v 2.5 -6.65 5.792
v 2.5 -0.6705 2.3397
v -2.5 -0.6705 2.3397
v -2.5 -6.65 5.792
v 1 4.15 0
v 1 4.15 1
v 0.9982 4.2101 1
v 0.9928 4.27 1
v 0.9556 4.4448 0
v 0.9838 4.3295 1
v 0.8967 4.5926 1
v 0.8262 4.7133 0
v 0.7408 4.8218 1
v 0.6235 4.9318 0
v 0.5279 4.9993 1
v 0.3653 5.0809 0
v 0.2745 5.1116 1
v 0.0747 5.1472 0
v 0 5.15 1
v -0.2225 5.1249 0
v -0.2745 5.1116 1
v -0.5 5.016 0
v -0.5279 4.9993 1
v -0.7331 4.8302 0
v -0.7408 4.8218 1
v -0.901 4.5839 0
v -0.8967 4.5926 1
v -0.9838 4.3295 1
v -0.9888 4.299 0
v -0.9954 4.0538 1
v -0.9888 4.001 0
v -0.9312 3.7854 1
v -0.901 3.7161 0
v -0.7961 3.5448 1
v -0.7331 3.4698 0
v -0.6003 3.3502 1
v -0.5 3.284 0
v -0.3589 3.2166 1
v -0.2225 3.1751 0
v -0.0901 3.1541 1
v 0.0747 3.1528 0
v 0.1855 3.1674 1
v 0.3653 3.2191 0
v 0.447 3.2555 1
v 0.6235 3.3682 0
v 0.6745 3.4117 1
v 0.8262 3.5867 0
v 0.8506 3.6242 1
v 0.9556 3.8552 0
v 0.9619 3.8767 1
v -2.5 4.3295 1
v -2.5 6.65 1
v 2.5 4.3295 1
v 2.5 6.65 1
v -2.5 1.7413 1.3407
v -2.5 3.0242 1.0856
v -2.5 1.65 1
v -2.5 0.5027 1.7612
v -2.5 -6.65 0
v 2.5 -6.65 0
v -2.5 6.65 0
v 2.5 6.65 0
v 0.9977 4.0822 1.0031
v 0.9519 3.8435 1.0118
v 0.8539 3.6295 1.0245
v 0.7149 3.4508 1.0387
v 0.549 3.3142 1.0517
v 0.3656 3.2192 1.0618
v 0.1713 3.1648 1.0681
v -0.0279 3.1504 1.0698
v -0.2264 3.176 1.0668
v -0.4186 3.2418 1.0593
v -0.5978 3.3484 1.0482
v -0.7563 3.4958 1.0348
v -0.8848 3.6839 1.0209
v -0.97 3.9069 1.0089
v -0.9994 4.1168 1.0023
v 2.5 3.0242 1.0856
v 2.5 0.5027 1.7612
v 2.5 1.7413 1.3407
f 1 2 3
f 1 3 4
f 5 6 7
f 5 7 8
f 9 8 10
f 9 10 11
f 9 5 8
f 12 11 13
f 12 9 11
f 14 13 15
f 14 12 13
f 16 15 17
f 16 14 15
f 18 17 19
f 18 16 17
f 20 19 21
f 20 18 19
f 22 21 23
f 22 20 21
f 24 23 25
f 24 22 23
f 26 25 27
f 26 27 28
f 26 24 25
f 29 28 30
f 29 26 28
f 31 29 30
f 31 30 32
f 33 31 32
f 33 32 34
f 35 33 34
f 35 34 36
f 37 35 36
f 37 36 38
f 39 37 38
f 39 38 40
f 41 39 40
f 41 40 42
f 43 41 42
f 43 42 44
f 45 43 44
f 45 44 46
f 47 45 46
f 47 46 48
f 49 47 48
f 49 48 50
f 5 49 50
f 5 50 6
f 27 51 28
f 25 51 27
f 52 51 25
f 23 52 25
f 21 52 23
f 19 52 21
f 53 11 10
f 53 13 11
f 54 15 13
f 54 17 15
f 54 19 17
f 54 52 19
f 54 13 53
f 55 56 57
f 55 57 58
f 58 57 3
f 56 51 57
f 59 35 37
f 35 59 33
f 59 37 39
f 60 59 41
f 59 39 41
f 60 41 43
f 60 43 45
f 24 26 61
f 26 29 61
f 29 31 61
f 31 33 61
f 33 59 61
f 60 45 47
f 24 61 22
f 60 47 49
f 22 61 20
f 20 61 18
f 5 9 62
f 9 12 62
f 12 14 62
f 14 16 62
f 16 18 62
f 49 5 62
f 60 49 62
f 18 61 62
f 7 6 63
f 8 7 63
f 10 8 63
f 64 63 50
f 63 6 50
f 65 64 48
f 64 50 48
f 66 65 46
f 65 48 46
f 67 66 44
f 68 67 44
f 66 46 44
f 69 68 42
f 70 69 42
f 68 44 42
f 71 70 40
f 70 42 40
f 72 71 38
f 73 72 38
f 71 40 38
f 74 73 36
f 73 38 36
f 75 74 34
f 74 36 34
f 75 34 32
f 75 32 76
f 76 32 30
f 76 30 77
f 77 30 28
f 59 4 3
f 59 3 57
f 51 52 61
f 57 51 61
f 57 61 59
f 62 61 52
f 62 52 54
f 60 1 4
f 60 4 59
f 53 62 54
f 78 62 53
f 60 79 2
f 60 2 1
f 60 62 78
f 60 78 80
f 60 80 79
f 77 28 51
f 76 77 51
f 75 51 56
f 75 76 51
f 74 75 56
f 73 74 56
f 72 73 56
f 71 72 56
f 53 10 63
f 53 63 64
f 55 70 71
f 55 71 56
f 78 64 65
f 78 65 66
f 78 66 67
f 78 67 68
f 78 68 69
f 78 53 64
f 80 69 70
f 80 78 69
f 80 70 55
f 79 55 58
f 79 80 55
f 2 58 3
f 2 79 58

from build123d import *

# Parameters (mm, degrees)
SKETCH_1_W      = 5
SKETCH_1_H      = 13.3
SKETCH_1_R      = 1
EXTRUDE_1_DEPTH = 1
EXTRUDE_3_DEPTH = 2.5
FILLET_1_R      = 10


with BuildPart() as part:
    # 草图1 → 凸台-拉伸1 (new body)
    with BuildSketch(Plane.XY):
        Rectangle(SKETCH_1_W, SKETCH_1_H)
        with Locations((0, 4.15)):
            Circle(SKETCH_1_R, mode=Mode.SUBTRACT)
    extrude(amount=EXTRUDE_1_DEPTH)

    # 草图2 → 凸台-拉伸3 (add, symmetric)
    with BuildSketch(Plane(origin=(0, 0, 0), x_dir=(0, 0, -1), z_dir=(1, 0, 0))):
        Polygon((-1, 1.65), (-5.792007234, -6.65), (-1, -6.65), align=None)
    extrude(amount=EXTRUDE_3_DEPTH, both=True)

    # 圆角1
    # the kernel refuses this fillet: 10 mm, written as the material it adds along each edge
    with BuildSketch(Plane(origin=(2.5, 1.65, 1), x_dir=(0, 1, 0), z_dir=(-1, 0, 0))) as fillet_1_piece_1_section:
        with BuildLine():
            CenterArc((FILLET_1_R * 0.267949192431, -FILLET_1_R), FILLET_1_R, 90, 30)
            Line((-FILLET_1_R * 0.232050807569, -FILLET_1_R * 0.133974596216), (0, 0))
            Line((0, 0), (FILLET_1_R * 0.267949192431, 0))
        make_face()
    fillet_1_piece_1 = extrude(amount=5, mode=Mode.PRIVATE)
    fillet_1_piece_1 = fillet_1_piece_1 - Plane(origin=(0, 4.15, 1.267699118), x_dir=(1, 0, 0), z_dir=(0, 0, -1)) * Cylinder(1, 21, mode=Mode.PRIVATE)
    add(fillet_1_piece_1)


solid = part.part
